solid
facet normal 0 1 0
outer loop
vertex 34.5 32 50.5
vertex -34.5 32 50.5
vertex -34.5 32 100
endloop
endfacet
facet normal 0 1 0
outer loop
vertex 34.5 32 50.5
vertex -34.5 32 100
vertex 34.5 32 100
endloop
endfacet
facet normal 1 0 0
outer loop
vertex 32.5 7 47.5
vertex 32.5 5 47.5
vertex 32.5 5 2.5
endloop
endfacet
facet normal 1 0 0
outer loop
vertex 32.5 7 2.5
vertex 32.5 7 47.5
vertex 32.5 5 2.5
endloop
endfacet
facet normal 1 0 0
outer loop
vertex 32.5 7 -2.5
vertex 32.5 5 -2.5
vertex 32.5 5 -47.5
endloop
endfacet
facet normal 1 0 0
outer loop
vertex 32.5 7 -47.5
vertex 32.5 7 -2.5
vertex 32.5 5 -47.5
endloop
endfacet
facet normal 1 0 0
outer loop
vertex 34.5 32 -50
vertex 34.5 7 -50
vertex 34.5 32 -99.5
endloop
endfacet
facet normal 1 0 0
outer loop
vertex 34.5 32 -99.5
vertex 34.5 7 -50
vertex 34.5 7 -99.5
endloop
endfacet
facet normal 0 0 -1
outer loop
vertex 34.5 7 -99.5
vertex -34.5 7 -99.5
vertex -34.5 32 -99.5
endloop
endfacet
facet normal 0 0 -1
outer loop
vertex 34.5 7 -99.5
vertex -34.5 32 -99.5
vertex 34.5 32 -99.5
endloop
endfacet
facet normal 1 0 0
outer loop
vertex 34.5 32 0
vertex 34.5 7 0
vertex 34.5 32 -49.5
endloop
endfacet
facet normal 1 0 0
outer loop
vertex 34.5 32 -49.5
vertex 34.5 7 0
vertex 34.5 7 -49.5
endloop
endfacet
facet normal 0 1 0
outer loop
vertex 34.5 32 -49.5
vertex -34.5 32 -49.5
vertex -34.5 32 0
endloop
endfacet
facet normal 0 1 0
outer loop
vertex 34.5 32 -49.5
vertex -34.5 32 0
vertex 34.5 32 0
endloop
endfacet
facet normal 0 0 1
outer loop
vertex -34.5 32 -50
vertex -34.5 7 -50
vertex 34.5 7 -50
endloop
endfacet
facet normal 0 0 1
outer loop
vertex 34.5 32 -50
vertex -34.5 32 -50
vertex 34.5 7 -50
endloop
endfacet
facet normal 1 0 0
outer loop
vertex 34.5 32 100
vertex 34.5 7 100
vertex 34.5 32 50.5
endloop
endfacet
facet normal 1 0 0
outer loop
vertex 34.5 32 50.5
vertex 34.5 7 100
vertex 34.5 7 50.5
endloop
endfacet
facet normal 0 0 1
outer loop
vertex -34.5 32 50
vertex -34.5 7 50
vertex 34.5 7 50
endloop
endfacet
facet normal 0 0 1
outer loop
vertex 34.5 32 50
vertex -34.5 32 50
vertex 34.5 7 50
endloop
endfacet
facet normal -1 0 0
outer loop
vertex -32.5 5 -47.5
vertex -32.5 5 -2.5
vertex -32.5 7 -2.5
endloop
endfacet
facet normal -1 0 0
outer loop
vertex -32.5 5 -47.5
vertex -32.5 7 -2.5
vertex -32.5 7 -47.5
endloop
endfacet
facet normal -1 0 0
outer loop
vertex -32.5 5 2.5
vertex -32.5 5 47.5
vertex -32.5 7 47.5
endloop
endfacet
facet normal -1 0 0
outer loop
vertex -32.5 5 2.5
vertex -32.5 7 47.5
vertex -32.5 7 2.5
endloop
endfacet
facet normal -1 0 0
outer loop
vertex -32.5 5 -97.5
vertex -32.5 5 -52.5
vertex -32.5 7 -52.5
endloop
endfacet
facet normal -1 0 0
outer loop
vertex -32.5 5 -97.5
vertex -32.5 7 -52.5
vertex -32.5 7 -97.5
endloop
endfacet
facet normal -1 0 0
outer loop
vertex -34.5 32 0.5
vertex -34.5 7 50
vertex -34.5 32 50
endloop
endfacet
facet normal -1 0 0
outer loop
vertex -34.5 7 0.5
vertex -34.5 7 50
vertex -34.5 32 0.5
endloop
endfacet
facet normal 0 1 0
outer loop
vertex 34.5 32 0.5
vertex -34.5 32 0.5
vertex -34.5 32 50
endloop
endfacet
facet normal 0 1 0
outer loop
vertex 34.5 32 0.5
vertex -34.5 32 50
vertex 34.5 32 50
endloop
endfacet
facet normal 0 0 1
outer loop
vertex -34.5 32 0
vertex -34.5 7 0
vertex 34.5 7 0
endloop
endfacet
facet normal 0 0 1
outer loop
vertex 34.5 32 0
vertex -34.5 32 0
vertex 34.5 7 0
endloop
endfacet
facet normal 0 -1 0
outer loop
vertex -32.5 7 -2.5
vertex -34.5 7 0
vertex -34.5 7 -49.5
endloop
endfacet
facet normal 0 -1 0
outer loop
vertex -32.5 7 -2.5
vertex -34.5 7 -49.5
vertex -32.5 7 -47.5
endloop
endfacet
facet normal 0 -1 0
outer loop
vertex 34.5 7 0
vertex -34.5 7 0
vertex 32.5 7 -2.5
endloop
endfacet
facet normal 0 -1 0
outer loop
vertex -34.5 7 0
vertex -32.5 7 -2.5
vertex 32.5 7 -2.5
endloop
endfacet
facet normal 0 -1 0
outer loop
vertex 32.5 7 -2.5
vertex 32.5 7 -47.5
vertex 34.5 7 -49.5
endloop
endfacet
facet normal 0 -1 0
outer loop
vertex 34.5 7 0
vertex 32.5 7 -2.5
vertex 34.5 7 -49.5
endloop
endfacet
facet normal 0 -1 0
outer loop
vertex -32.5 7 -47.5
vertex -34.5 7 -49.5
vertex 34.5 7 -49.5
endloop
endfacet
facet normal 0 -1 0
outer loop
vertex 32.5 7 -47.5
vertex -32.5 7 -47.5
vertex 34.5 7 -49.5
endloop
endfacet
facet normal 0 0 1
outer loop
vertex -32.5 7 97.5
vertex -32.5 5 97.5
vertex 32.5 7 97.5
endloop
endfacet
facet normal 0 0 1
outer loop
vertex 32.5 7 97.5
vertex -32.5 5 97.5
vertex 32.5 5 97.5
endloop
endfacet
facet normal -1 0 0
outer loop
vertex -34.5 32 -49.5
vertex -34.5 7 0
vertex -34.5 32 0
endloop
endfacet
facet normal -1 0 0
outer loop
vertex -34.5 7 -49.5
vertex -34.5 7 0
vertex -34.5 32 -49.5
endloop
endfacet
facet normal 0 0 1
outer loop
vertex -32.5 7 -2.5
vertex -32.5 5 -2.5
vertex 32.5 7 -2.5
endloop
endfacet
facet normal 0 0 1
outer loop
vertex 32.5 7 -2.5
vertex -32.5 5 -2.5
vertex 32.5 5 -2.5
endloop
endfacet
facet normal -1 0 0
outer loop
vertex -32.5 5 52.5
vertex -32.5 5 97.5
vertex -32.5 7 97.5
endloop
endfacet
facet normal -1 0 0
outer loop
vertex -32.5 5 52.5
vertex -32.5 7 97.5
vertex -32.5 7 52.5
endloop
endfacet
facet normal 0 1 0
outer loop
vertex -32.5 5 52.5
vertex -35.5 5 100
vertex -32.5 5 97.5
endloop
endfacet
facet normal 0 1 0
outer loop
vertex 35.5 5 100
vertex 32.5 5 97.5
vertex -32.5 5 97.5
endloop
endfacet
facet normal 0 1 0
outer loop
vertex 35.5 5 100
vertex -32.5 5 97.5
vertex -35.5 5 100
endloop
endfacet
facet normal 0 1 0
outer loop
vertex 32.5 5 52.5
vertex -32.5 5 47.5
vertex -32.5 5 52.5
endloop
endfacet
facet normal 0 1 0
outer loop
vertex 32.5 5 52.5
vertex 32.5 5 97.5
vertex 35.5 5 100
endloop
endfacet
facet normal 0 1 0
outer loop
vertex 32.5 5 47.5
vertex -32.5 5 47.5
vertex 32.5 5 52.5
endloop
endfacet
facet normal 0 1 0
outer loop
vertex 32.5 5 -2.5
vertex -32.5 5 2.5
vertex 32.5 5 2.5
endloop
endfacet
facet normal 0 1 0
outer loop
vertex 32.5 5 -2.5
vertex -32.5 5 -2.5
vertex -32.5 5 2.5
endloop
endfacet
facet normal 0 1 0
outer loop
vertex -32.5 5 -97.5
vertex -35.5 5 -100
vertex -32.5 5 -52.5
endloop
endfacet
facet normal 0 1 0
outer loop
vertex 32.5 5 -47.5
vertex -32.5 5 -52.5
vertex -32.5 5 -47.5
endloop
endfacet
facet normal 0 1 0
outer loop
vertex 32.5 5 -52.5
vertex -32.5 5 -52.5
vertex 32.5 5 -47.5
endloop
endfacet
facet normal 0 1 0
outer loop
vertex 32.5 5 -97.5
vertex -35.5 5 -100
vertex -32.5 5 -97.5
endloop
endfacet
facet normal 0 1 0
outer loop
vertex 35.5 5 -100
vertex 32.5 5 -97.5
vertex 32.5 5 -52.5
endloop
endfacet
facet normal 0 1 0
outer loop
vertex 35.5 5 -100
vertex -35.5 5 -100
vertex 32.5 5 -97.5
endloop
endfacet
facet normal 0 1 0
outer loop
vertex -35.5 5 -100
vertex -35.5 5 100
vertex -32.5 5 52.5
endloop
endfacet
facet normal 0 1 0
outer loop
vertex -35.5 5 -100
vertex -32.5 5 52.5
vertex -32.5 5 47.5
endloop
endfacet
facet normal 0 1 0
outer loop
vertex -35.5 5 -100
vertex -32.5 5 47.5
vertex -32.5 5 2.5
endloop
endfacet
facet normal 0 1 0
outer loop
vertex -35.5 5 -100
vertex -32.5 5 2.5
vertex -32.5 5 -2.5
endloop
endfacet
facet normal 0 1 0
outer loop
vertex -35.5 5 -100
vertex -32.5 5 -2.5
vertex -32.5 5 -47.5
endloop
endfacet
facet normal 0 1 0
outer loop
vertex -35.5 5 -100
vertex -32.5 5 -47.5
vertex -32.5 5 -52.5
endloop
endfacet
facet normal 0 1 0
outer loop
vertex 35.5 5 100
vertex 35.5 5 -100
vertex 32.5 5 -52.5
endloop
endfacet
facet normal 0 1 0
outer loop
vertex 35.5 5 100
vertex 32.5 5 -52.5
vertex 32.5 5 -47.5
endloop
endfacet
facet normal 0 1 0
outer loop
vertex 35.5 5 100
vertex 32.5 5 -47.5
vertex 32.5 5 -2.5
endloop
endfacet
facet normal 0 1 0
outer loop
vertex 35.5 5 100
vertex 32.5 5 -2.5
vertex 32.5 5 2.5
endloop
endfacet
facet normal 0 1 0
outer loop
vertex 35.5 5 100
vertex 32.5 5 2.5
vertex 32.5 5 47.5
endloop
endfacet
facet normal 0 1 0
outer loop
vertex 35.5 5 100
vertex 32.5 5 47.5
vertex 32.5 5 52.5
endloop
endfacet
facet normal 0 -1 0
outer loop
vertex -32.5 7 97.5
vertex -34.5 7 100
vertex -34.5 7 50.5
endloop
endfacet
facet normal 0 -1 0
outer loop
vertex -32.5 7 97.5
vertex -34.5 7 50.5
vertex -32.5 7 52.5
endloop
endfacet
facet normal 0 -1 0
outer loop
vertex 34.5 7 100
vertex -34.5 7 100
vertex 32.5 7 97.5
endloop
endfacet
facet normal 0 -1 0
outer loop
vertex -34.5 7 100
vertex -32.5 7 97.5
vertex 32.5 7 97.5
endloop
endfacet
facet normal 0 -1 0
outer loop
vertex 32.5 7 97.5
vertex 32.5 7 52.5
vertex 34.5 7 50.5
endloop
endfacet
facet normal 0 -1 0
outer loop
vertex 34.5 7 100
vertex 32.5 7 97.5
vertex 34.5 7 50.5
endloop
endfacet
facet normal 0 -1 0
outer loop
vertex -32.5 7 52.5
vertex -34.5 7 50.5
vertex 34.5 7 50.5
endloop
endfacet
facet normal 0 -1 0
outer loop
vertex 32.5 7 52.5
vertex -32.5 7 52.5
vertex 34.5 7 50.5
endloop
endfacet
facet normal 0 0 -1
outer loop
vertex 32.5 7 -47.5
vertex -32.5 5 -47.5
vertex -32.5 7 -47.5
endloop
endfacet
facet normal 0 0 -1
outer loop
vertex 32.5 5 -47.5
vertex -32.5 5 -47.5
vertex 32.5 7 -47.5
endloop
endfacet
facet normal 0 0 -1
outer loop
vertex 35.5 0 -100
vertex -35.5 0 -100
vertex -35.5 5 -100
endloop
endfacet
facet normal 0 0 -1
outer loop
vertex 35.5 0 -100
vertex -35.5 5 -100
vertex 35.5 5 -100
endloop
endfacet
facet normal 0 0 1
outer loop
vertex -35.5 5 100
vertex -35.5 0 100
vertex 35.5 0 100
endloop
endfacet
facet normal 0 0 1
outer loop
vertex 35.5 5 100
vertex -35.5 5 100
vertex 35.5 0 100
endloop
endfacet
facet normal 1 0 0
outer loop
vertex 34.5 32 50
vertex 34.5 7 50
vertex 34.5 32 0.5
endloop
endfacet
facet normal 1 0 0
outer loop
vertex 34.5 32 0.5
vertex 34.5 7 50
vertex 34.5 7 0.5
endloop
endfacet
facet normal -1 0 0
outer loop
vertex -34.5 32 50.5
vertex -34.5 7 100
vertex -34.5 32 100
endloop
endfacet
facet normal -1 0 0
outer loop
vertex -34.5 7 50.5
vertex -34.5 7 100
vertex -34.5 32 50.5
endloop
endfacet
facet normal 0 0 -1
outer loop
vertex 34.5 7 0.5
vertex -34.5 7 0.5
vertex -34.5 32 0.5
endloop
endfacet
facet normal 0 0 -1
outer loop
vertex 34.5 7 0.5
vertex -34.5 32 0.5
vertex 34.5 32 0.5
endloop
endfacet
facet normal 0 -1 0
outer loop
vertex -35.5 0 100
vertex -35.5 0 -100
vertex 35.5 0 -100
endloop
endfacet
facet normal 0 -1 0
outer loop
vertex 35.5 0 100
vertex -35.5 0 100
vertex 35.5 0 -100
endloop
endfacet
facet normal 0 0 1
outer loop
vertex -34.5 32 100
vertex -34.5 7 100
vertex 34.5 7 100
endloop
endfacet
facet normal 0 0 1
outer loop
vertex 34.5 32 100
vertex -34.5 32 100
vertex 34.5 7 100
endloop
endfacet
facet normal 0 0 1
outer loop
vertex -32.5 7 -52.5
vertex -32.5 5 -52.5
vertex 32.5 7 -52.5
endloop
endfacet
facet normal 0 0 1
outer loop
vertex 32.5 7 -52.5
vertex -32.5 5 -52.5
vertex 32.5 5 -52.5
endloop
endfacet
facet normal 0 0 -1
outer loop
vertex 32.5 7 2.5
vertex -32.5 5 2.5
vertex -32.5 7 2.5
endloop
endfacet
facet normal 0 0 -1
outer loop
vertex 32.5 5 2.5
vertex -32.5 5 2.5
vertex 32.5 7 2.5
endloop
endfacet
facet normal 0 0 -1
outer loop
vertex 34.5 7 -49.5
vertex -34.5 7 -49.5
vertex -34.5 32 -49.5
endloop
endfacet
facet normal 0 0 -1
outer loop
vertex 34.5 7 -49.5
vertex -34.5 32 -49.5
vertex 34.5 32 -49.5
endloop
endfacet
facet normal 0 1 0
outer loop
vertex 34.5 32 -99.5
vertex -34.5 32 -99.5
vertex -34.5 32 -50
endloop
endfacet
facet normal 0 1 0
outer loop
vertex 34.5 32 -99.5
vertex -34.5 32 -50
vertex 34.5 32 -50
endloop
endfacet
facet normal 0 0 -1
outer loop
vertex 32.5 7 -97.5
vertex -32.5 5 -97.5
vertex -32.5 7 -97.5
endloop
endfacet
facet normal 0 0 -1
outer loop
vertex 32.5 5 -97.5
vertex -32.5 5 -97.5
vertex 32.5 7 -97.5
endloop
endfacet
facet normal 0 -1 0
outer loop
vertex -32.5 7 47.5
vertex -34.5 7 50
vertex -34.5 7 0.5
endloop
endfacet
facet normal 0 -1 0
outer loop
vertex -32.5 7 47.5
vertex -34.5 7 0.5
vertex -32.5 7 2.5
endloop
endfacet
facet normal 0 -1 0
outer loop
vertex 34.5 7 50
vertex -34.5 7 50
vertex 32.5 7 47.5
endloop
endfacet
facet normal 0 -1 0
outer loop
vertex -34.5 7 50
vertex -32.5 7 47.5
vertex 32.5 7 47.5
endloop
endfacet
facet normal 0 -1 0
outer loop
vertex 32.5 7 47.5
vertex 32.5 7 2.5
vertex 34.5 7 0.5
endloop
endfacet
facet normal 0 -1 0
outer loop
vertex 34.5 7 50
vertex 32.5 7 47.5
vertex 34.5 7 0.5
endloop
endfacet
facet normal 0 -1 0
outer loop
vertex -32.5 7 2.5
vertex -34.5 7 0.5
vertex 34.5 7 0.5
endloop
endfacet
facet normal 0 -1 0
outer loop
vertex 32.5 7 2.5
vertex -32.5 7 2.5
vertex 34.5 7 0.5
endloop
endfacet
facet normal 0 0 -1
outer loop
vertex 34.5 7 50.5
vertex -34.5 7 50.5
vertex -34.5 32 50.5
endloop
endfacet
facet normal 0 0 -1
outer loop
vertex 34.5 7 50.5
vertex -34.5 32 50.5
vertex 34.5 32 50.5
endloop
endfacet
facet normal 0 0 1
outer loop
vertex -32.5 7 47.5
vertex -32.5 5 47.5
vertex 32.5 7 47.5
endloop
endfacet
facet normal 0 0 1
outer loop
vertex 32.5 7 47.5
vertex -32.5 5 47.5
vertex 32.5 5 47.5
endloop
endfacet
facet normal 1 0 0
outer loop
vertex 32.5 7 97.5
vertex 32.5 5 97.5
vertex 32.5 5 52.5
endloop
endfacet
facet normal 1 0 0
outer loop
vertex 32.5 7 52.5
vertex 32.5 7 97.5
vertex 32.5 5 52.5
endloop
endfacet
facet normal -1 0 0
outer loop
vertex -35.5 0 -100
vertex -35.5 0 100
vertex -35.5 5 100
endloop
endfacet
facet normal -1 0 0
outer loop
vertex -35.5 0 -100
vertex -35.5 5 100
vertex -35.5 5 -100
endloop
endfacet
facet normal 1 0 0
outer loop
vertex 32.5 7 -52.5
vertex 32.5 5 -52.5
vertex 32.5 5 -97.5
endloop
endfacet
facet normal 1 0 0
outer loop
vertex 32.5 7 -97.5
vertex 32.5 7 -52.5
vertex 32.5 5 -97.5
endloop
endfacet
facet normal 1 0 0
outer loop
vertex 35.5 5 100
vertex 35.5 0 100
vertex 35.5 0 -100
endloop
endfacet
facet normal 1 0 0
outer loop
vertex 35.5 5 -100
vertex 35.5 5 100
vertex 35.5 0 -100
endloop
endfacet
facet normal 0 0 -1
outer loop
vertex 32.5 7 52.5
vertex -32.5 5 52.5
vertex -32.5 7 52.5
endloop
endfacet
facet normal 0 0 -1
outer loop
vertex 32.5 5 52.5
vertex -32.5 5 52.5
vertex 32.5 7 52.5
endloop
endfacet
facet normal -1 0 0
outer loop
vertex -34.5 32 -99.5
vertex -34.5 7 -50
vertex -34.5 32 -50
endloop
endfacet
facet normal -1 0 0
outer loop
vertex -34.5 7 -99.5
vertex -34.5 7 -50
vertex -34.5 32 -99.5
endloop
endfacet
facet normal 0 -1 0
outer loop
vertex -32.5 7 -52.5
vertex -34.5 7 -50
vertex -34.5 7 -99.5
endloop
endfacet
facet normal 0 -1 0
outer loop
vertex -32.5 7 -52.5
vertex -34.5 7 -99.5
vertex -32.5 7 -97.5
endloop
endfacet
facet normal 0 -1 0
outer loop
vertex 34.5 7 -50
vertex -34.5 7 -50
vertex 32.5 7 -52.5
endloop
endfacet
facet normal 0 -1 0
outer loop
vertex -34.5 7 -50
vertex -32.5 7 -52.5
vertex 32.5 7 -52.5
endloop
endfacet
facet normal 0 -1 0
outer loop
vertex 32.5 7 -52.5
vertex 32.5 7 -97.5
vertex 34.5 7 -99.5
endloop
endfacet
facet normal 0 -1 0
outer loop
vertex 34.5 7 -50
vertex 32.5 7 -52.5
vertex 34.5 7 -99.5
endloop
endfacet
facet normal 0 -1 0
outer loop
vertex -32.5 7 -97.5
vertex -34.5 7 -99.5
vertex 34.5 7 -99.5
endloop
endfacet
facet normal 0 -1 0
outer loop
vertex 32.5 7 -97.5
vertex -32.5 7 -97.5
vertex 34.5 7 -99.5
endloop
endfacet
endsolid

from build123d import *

# Parameters (mm, degrees)
SKETCH1_W           = 71
SKETCH1_H           = 200
BOSS_EXTRUDE1_DEPTH = 5
SKETCH2_W           = 65
SKETCH2_H           = 45
BOSS_EXTRUDE3_DEPTH = 2
LPATTERN1_COUNT     = 4
LPATTERN1_PITCH     = 50
SKETCH3_W           = 69
SKETCH3_H           = 49.5
BOSS_EXTRUDE8_DEPTH = 25
LPATTERN5_COUNT     = 4
LPATTERN5_PITCH     = 50


with BuildPart() as part:
    # Sketch1 → Boss-Extrude1 (new body)
    with BuildSketch(Plane(origin=(0, 0, 0), x_dir=(1, 0, 0), z_dir=(0, 1, 0))):
        Rectangle(SKETCH1_W, SKETCH1_H)
    extrude(amount=BOSS_EXTRUDE1_DEPTH)

    # Sketch2 → Boss-Extrude3 (add)
    with BuildSketch(Plane(origin=(0, 5, 0), x_dir=(1, 0, 0), z_dir=(0, 1, 0))):
        with Locations((0, -75)):
            Rectangle(SKETCH2_W, SKETCH2_H)
    boss_extrude3 = extrude(amount=BOSS_EXTRUDE3_DEPTH)

    # LPattern1: Boss-Extrude3 ×4
    with Locations(*[(0, 0, -i * LPATTERN1_PITCH) for i in range(1, LPATTERN1_COUNT)]):
        add(boss_extrude3)

    # Sketch3 → Boss-Extrude8 (add)
    with BuildSketch(Plane(origin=(0, 7, 0), x_dir=(1, 0, 0), z_dir=(0, 1, 0))):
        with Locations((0, -75.25)):
            Rectangle(SKETCH3_W, SKETCH3_H)
    boss_extrude8 = extrude(amount=BOSS_EXTRUDE8_DEPTH)

    # LPattern5: Boss-Extrude8 ×4
    with Locations(*[(0, 0, -i * LPATTERN5_PITCH) for i in range(1, LPATTERN5_COUNT)]):
        add(boss_extrude8)


solid = part.part
